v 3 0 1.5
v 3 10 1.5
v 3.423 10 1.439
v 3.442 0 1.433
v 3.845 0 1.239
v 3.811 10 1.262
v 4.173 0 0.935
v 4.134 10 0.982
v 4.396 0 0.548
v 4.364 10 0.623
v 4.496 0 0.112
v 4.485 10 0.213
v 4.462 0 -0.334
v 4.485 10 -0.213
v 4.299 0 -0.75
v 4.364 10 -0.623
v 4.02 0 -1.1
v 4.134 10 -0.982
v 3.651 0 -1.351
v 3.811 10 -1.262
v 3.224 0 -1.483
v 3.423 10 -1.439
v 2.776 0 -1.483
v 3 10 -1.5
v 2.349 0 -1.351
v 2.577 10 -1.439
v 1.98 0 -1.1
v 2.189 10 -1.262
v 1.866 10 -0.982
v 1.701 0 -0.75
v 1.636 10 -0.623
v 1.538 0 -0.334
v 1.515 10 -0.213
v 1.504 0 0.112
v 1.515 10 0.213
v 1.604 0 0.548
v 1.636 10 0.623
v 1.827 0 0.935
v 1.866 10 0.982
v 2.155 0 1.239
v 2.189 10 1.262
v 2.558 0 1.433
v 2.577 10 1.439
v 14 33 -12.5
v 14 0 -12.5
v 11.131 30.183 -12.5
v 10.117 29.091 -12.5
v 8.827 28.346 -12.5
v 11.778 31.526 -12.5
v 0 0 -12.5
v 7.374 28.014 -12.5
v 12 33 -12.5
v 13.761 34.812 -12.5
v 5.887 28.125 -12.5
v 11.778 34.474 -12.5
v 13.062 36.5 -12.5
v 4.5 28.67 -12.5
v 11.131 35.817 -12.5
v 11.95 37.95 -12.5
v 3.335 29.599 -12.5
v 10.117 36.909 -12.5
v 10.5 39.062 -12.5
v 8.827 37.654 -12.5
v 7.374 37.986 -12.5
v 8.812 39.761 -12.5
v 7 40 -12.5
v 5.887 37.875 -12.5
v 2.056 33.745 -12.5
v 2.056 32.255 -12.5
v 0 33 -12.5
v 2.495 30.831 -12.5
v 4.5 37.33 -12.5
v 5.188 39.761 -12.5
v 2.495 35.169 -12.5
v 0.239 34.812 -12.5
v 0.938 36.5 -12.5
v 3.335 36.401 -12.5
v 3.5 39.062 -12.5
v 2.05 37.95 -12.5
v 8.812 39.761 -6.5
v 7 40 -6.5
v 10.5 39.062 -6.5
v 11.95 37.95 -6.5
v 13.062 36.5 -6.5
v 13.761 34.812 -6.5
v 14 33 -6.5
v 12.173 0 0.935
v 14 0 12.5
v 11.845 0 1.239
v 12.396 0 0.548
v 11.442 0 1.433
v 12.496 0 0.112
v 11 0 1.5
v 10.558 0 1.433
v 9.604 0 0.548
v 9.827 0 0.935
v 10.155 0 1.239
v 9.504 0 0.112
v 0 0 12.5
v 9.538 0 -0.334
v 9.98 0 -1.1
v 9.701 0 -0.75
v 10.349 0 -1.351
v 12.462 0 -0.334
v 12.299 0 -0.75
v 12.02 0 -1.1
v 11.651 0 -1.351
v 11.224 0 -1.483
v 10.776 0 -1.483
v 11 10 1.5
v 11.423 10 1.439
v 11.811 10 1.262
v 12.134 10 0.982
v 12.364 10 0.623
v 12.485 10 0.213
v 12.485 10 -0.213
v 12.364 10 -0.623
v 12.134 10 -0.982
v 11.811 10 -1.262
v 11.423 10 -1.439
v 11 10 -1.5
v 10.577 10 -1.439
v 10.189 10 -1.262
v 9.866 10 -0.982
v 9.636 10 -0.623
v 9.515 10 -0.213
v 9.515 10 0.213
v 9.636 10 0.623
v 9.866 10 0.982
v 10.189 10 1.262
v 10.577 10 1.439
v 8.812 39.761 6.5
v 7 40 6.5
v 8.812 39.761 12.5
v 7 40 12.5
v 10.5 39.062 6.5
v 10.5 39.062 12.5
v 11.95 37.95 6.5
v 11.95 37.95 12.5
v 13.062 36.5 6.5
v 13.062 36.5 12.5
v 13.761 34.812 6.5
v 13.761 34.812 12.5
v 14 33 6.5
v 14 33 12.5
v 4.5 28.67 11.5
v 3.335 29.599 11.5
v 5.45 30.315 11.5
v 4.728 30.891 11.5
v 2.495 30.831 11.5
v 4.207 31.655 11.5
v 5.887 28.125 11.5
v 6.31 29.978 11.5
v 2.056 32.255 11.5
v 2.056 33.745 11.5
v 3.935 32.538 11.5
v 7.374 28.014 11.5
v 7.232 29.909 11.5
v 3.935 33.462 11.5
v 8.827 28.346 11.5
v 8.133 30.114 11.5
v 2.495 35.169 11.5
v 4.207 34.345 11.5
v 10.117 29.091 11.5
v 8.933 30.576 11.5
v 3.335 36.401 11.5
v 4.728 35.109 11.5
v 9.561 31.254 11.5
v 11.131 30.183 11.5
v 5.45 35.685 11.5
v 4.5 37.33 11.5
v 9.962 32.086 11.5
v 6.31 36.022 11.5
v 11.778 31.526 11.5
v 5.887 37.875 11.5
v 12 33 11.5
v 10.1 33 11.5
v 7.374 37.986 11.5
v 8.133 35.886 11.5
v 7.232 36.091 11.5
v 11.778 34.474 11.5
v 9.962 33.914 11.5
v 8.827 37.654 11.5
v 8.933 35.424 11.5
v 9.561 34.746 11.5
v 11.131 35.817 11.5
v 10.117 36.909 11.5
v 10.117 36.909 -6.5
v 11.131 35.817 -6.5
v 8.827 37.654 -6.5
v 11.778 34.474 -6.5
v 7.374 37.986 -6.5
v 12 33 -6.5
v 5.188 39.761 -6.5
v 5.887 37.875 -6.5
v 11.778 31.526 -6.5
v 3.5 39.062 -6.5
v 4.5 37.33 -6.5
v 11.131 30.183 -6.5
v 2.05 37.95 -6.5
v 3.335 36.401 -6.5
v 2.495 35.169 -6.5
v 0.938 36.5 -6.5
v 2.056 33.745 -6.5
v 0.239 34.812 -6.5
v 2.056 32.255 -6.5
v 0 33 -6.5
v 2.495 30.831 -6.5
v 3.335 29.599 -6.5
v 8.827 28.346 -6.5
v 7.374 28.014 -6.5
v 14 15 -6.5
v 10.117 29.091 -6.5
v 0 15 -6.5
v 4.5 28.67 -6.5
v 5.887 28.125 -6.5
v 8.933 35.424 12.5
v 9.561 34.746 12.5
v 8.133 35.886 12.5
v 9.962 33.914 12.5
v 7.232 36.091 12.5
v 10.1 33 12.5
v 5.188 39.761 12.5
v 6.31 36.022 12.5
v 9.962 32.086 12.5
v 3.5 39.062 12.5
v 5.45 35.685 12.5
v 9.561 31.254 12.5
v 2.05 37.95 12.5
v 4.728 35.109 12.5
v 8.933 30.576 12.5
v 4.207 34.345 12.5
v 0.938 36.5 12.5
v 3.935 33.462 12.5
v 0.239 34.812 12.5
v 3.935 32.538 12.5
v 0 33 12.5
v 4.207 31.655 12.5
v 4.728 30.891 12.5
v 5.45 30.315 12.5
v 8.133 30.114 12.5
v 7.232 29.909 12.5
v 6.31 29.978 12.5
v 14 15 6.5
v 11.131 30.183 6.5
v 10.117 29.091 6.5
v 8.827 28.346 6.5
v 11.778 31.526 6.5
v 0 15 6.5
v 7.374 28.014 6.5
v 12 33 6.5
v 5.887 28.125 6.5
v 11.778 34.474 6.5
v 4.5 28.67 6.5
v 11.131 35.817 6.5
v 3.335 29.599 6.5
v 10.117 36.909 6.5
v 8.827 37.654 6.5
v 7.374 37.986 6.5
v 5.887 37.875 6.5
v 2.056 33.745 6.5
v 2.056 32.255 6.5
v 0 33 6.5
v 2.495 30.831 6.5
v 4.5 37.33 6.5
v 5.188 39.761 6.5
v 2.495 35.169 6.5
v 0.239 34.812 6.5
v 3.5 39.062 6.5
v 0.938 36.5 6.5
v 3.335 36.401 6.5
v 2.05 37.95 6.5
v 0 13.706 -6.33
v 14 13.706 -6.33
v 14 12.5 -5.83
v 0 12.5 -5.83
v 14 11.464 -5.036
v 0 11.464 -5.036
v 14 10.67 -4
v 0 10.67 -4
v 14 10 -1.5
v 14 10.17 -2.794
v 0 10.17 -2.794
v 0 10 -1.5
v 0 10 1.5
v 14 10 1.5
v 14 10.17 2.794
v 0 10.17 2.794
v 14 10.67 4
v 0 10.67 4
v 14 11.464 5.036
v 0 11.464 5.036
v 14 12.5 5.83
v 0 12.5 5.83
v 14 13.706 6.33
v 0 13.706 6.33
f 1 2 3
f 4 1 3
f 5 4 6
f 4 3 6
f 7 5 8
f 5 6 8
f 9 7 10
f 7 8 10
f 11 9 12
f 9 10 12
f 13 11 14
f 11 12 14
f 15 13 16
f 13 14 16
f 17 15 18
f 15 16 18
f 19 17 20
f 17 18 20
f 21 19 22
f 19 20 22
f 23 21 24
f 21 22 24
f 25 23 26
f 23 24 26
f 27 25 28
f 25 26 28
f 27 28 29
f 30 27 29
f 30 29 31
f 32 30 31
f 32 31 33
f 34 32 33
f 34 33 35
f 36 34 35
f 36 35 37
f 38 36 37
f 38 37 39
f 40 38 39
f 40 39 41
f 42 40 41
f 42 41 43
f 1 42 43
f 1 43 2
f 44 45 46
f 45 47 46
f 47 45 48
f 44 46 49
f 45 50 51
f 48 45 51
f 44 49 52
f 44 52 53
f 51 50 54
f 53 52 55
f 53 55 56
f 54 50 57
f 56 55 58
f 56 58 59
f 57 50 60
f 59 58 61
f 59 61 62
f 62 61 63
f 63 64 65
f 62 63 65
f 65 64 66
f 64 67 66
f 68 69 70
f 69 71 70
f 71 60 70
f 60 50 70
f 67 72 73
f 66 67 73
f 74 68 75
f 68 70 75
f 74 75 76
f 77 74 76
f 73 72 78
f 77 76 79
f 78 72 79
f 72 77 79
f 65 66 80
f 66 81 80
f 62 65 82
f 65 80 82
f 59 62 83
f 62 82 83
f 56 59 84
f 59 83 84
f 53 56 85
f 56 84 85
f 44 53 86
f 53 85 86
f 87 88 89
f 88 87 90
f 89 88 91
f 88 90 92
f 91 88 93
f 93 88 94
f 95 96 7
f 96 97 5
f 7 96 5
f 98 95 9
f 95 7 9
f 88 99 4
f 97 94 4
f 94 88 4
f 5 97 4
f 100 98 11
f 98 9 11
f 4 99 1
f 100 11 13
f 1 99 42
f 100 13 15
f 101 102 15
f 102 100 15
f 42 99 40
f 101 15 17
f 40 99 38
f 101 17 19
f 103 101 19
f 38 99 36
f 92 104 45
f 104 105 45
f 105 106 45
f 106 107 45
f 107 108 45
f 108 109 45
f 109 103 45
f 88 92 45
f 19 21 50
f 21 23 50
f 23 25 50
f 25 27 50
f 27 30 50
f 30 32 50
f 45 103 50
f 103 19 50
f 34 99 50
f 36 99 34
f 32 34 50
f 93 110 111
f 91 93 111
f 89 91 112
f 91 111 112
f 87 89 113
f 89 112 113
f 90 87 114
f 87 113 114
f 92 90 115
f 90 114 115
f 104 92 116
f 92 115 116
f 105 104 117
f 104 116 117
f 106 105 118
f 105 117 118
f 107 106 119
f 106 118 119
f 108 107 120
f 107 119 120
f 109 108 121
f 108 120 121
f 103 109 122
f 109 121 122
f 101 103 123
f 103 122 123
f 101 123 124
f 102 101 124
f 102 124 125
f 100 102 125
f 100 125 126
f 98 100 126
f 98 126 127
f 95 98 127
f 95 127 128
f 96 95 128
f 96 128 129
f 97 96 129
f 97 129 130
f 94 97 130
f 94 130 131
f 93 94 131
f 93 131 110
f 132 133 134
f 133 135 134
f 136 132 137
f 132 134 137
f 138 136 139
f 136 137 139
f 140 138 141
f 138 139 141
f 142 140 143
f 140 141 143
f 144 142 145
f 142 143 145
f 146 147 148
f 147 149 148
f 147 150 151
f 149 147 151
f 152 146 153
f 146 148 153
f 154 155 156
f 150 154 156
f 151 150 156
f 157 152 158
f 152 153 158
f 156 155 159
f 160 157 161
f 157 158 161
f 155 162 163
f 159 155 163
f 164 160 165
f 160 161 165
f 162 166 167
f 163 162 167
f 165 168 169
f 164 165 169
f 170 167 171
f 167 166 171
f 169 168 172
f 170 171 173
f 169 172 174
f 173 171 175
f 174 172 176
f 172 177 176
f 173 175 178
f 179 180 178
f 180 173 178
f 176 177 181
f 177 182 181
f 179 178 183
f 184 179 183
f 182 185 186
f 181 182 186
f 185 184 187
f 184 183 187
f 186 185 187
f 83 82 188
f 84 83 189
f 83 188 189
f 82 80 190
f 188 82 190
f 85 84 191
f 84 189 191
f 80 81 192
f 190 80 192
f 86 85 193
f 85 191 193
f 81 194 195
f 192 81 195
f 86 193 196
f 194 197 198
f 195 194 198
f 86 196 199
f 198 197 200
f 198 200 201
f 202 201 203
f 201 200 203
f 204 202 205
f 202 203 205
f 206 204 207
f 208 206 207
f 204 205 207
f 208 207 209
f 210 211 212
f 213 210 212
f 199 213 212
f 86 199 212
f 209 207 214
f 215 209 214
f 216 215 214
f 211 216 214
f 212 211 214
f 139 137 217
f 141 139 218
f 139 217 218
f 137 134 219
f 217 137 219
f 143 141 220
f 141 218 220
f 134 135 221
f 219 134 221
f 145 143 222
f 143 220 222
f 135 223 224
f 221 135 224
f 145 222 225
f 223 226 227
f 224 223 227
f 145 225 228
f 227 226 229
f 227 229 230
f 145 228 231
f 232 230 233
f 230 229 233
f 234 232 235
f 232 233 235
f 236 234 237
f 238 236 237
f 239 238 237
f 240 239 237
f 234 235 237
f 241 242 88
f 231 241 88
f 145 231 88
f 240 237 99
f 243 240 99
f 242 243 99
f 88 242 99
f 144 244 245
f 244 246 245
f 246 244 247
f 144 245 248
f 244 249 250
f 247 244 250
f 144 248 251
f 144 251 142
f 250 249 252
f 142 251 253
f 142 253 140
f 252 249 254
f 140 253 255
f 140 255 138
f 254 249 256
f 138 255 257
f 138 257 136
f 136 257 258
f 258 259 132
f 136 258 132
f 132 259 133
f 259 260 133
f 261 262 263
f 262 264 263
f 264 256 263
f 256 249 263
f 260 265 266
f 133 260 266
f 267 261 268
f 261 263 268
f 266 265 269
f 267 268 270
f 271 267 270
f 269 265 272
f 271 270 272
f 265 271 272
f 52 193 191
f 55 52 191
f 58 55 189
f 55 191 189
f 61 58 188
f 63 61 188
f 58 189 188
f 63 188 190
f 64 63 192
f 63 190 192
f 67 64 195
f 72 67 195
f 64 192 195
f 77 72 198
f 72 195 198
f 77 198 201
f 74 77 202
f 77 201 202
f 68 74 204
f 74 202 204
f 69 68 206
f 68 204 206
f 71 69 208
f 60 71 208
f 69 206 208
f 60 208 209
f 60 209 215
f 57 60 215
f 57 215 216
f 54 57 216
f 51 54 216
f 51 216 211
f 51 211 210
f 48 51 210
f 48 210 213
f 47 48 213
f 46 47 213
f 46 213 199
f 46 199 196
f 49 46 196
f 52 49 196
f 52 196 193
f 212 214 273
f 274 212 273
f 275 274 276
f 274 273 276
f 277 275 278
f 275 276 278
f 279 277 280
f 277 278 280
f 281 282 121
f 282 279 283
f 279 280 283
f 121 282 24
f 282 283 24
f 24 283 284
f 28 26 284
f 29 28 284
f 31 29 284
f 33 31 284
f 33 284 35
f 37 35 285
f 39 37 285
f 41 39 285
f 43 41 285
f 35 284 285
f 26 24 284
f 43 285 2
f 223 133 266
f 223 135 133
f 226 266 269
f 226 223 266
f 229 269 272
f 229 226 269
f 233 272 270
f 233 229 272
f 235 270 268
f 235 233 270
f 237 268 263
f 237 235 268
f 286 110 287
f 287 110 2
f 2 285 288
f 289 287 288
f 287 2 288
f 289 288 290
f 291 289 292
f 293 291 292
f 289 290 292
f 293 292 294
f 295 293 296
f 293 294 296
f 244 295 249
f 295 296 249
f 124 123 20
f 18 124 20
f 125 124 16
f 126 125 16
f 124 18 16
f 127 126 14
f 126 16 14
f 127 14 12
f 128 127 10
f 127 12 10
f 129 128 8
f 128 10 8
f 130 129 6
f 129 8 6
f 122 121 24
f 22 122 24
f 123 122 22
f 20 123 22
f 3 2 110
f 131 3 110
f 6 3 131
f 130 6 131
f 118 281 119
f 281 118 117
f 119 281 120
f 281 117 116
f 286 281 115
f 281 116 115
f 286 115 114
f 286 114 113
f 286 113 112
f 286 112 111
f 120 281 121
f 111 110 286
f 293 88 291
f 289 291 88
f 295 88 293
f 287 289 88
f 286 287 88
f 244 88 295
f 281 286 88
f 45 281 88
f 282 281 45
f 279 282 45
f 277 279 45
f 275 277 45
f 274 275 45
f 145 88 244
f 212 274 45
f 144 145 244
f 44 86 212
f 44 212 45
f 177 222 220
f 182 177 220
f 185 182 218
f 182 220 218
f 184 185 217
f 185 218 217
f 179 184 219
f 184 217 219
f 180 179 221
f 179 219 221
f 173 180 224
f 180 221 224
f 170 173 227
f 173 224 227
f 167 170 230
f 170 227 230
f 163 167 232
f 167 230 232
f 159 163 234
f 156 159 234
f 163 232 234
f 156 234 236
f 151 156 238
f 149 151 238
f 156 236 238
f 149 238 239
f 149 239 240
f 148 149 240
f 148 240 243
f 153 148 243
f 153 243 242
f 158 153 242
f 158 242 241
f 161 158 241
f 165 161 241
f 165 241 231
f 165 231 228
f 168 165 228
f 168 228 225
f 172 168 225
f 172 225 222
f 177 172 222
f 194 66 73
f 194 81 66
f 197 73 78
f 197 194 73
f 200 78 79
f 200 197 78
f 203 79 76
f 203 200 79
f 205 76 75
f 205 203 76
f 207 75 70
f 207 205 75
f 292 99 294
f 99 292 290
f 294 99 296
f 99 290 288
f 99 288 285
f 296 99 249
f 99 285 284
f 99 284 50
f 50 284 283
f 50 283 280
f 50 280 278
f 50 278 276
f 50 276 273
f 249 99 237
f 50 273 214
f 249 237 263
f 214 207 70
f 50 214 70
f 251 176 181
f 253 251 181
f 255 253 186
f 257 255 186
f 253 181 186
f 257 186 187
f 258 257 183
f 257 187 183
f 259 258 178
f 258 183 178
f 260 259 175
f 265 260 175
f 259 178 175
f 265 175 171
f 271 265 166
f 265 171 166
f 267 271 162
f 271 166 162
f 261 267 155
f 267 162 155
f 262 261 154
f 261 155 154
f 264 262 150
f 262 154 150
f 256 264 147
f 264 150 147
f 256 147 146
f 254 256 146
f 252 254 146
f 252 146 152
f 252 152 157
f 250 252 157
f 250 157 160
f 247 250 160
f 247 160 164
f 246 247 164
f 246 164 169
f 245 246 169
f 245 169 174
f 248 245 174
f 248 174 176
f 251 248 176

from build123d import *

# Parameters (mm, degrees)
EXTRUDE_1_DEPTH     = 14
FILLET_1_R          = 7
CUT_EXTRUDE_START   = -1
SKETCH_7_R          = 5
CUT_EXTRUDE_1_DEPTH = 31
SKETCH_8_R          = 3.1
CUT_EXTRUDE_2_DEPTH = 35
SKETCH_10_R         = 1.5
CUT_EXTRUDE_3_DEPTH = 20


with BuildPart() as part:
    # 草图4 → 凸台-拉伸1 (new body)
    with BuildSketch(Plane(origin=(0, 0, 0), x_dir=(0, 0, -1), z_dir=(1, 0, 0))):
        with BuildLine():
            Line((0, 0), (12.5, 0))
            Line((12.5, 0), (12.5, 40))
            Line((12.5, 40), (6.5, 40))
            Line((6.5, 40), (6.5, 15))
            ThreePointArc((6.5, 15), (5.035533906, 11.464466094), (1.5, 10))
            Line((1.5, 10), (-1.5, 10))
            ThreePointArc((-1.5, 10), (-5.035533906, 11.464466094), (-6.5, 15))
            Line((-6.5, 15), (-6.5, 40))
            Line((-6.5, 40), (-12.5, 40))
            Line((-12.5, 40), (-12.5, 0))
            Line((-12.5, 0), (0, 0))
        make_face()
    extrude(amount=EXTRUDE_1_DEPTH)

    # 圆角1
    fillet_1_edges = [part.edges().sort_by_distance(p)[0] for p in [
        (0, 40, 9.5),
        (0, 40, -9.5),
        (14, 40, -9.5),
        (14, 40, 9.5),
    ]]
    fillet(fillet_1_edges, radius=FILLET_1_R - 0.0001)  # a hair under: the kernel refuses the full size

    # 草图7 → 切除-拉伸1 (cut)
    with BuildSketch(Plane.XY.offset(12.5).offset(CUT_EXTRUDE_START)):
        with Locations((7, 33)):
            Circle(SKETCH_7_R)
    extrude(amount=-CUT_EXTRUDE_1_DEPTH, mode=Mode.SUBTRACT)

    # 草图8 → 切除-拉伸2 (cut)
    with BuildSketch(Plane.XY.offset(12.5)):
        with Locations((7, 33)):
            Circle(SKETCH_8_R)
    extrude(amount=-CUT_EXTRUDE_2_DEPTH, mode=Mode.SUBTRACT)

    # 草图10 → 切除-拉伸3 (cut)
    with BuildSketch(Plane(origin=(0, 10, 0), x_dir=(1, 0, 0), z_dir=(0, 1, 0))):
        with Locations(Location((3, 0, 0), (0, 0, 270))):
            Circle(SKETCH_10_R)
        with Locations(Location((11, 0, 0), (0, 0, 270))):
            Circle(SKETCH_10_R)
    extrude(amount=-CUT_EXTRUDE_3_DEPTH, mode=Mode.SUBTRACT)


solid = part.part
